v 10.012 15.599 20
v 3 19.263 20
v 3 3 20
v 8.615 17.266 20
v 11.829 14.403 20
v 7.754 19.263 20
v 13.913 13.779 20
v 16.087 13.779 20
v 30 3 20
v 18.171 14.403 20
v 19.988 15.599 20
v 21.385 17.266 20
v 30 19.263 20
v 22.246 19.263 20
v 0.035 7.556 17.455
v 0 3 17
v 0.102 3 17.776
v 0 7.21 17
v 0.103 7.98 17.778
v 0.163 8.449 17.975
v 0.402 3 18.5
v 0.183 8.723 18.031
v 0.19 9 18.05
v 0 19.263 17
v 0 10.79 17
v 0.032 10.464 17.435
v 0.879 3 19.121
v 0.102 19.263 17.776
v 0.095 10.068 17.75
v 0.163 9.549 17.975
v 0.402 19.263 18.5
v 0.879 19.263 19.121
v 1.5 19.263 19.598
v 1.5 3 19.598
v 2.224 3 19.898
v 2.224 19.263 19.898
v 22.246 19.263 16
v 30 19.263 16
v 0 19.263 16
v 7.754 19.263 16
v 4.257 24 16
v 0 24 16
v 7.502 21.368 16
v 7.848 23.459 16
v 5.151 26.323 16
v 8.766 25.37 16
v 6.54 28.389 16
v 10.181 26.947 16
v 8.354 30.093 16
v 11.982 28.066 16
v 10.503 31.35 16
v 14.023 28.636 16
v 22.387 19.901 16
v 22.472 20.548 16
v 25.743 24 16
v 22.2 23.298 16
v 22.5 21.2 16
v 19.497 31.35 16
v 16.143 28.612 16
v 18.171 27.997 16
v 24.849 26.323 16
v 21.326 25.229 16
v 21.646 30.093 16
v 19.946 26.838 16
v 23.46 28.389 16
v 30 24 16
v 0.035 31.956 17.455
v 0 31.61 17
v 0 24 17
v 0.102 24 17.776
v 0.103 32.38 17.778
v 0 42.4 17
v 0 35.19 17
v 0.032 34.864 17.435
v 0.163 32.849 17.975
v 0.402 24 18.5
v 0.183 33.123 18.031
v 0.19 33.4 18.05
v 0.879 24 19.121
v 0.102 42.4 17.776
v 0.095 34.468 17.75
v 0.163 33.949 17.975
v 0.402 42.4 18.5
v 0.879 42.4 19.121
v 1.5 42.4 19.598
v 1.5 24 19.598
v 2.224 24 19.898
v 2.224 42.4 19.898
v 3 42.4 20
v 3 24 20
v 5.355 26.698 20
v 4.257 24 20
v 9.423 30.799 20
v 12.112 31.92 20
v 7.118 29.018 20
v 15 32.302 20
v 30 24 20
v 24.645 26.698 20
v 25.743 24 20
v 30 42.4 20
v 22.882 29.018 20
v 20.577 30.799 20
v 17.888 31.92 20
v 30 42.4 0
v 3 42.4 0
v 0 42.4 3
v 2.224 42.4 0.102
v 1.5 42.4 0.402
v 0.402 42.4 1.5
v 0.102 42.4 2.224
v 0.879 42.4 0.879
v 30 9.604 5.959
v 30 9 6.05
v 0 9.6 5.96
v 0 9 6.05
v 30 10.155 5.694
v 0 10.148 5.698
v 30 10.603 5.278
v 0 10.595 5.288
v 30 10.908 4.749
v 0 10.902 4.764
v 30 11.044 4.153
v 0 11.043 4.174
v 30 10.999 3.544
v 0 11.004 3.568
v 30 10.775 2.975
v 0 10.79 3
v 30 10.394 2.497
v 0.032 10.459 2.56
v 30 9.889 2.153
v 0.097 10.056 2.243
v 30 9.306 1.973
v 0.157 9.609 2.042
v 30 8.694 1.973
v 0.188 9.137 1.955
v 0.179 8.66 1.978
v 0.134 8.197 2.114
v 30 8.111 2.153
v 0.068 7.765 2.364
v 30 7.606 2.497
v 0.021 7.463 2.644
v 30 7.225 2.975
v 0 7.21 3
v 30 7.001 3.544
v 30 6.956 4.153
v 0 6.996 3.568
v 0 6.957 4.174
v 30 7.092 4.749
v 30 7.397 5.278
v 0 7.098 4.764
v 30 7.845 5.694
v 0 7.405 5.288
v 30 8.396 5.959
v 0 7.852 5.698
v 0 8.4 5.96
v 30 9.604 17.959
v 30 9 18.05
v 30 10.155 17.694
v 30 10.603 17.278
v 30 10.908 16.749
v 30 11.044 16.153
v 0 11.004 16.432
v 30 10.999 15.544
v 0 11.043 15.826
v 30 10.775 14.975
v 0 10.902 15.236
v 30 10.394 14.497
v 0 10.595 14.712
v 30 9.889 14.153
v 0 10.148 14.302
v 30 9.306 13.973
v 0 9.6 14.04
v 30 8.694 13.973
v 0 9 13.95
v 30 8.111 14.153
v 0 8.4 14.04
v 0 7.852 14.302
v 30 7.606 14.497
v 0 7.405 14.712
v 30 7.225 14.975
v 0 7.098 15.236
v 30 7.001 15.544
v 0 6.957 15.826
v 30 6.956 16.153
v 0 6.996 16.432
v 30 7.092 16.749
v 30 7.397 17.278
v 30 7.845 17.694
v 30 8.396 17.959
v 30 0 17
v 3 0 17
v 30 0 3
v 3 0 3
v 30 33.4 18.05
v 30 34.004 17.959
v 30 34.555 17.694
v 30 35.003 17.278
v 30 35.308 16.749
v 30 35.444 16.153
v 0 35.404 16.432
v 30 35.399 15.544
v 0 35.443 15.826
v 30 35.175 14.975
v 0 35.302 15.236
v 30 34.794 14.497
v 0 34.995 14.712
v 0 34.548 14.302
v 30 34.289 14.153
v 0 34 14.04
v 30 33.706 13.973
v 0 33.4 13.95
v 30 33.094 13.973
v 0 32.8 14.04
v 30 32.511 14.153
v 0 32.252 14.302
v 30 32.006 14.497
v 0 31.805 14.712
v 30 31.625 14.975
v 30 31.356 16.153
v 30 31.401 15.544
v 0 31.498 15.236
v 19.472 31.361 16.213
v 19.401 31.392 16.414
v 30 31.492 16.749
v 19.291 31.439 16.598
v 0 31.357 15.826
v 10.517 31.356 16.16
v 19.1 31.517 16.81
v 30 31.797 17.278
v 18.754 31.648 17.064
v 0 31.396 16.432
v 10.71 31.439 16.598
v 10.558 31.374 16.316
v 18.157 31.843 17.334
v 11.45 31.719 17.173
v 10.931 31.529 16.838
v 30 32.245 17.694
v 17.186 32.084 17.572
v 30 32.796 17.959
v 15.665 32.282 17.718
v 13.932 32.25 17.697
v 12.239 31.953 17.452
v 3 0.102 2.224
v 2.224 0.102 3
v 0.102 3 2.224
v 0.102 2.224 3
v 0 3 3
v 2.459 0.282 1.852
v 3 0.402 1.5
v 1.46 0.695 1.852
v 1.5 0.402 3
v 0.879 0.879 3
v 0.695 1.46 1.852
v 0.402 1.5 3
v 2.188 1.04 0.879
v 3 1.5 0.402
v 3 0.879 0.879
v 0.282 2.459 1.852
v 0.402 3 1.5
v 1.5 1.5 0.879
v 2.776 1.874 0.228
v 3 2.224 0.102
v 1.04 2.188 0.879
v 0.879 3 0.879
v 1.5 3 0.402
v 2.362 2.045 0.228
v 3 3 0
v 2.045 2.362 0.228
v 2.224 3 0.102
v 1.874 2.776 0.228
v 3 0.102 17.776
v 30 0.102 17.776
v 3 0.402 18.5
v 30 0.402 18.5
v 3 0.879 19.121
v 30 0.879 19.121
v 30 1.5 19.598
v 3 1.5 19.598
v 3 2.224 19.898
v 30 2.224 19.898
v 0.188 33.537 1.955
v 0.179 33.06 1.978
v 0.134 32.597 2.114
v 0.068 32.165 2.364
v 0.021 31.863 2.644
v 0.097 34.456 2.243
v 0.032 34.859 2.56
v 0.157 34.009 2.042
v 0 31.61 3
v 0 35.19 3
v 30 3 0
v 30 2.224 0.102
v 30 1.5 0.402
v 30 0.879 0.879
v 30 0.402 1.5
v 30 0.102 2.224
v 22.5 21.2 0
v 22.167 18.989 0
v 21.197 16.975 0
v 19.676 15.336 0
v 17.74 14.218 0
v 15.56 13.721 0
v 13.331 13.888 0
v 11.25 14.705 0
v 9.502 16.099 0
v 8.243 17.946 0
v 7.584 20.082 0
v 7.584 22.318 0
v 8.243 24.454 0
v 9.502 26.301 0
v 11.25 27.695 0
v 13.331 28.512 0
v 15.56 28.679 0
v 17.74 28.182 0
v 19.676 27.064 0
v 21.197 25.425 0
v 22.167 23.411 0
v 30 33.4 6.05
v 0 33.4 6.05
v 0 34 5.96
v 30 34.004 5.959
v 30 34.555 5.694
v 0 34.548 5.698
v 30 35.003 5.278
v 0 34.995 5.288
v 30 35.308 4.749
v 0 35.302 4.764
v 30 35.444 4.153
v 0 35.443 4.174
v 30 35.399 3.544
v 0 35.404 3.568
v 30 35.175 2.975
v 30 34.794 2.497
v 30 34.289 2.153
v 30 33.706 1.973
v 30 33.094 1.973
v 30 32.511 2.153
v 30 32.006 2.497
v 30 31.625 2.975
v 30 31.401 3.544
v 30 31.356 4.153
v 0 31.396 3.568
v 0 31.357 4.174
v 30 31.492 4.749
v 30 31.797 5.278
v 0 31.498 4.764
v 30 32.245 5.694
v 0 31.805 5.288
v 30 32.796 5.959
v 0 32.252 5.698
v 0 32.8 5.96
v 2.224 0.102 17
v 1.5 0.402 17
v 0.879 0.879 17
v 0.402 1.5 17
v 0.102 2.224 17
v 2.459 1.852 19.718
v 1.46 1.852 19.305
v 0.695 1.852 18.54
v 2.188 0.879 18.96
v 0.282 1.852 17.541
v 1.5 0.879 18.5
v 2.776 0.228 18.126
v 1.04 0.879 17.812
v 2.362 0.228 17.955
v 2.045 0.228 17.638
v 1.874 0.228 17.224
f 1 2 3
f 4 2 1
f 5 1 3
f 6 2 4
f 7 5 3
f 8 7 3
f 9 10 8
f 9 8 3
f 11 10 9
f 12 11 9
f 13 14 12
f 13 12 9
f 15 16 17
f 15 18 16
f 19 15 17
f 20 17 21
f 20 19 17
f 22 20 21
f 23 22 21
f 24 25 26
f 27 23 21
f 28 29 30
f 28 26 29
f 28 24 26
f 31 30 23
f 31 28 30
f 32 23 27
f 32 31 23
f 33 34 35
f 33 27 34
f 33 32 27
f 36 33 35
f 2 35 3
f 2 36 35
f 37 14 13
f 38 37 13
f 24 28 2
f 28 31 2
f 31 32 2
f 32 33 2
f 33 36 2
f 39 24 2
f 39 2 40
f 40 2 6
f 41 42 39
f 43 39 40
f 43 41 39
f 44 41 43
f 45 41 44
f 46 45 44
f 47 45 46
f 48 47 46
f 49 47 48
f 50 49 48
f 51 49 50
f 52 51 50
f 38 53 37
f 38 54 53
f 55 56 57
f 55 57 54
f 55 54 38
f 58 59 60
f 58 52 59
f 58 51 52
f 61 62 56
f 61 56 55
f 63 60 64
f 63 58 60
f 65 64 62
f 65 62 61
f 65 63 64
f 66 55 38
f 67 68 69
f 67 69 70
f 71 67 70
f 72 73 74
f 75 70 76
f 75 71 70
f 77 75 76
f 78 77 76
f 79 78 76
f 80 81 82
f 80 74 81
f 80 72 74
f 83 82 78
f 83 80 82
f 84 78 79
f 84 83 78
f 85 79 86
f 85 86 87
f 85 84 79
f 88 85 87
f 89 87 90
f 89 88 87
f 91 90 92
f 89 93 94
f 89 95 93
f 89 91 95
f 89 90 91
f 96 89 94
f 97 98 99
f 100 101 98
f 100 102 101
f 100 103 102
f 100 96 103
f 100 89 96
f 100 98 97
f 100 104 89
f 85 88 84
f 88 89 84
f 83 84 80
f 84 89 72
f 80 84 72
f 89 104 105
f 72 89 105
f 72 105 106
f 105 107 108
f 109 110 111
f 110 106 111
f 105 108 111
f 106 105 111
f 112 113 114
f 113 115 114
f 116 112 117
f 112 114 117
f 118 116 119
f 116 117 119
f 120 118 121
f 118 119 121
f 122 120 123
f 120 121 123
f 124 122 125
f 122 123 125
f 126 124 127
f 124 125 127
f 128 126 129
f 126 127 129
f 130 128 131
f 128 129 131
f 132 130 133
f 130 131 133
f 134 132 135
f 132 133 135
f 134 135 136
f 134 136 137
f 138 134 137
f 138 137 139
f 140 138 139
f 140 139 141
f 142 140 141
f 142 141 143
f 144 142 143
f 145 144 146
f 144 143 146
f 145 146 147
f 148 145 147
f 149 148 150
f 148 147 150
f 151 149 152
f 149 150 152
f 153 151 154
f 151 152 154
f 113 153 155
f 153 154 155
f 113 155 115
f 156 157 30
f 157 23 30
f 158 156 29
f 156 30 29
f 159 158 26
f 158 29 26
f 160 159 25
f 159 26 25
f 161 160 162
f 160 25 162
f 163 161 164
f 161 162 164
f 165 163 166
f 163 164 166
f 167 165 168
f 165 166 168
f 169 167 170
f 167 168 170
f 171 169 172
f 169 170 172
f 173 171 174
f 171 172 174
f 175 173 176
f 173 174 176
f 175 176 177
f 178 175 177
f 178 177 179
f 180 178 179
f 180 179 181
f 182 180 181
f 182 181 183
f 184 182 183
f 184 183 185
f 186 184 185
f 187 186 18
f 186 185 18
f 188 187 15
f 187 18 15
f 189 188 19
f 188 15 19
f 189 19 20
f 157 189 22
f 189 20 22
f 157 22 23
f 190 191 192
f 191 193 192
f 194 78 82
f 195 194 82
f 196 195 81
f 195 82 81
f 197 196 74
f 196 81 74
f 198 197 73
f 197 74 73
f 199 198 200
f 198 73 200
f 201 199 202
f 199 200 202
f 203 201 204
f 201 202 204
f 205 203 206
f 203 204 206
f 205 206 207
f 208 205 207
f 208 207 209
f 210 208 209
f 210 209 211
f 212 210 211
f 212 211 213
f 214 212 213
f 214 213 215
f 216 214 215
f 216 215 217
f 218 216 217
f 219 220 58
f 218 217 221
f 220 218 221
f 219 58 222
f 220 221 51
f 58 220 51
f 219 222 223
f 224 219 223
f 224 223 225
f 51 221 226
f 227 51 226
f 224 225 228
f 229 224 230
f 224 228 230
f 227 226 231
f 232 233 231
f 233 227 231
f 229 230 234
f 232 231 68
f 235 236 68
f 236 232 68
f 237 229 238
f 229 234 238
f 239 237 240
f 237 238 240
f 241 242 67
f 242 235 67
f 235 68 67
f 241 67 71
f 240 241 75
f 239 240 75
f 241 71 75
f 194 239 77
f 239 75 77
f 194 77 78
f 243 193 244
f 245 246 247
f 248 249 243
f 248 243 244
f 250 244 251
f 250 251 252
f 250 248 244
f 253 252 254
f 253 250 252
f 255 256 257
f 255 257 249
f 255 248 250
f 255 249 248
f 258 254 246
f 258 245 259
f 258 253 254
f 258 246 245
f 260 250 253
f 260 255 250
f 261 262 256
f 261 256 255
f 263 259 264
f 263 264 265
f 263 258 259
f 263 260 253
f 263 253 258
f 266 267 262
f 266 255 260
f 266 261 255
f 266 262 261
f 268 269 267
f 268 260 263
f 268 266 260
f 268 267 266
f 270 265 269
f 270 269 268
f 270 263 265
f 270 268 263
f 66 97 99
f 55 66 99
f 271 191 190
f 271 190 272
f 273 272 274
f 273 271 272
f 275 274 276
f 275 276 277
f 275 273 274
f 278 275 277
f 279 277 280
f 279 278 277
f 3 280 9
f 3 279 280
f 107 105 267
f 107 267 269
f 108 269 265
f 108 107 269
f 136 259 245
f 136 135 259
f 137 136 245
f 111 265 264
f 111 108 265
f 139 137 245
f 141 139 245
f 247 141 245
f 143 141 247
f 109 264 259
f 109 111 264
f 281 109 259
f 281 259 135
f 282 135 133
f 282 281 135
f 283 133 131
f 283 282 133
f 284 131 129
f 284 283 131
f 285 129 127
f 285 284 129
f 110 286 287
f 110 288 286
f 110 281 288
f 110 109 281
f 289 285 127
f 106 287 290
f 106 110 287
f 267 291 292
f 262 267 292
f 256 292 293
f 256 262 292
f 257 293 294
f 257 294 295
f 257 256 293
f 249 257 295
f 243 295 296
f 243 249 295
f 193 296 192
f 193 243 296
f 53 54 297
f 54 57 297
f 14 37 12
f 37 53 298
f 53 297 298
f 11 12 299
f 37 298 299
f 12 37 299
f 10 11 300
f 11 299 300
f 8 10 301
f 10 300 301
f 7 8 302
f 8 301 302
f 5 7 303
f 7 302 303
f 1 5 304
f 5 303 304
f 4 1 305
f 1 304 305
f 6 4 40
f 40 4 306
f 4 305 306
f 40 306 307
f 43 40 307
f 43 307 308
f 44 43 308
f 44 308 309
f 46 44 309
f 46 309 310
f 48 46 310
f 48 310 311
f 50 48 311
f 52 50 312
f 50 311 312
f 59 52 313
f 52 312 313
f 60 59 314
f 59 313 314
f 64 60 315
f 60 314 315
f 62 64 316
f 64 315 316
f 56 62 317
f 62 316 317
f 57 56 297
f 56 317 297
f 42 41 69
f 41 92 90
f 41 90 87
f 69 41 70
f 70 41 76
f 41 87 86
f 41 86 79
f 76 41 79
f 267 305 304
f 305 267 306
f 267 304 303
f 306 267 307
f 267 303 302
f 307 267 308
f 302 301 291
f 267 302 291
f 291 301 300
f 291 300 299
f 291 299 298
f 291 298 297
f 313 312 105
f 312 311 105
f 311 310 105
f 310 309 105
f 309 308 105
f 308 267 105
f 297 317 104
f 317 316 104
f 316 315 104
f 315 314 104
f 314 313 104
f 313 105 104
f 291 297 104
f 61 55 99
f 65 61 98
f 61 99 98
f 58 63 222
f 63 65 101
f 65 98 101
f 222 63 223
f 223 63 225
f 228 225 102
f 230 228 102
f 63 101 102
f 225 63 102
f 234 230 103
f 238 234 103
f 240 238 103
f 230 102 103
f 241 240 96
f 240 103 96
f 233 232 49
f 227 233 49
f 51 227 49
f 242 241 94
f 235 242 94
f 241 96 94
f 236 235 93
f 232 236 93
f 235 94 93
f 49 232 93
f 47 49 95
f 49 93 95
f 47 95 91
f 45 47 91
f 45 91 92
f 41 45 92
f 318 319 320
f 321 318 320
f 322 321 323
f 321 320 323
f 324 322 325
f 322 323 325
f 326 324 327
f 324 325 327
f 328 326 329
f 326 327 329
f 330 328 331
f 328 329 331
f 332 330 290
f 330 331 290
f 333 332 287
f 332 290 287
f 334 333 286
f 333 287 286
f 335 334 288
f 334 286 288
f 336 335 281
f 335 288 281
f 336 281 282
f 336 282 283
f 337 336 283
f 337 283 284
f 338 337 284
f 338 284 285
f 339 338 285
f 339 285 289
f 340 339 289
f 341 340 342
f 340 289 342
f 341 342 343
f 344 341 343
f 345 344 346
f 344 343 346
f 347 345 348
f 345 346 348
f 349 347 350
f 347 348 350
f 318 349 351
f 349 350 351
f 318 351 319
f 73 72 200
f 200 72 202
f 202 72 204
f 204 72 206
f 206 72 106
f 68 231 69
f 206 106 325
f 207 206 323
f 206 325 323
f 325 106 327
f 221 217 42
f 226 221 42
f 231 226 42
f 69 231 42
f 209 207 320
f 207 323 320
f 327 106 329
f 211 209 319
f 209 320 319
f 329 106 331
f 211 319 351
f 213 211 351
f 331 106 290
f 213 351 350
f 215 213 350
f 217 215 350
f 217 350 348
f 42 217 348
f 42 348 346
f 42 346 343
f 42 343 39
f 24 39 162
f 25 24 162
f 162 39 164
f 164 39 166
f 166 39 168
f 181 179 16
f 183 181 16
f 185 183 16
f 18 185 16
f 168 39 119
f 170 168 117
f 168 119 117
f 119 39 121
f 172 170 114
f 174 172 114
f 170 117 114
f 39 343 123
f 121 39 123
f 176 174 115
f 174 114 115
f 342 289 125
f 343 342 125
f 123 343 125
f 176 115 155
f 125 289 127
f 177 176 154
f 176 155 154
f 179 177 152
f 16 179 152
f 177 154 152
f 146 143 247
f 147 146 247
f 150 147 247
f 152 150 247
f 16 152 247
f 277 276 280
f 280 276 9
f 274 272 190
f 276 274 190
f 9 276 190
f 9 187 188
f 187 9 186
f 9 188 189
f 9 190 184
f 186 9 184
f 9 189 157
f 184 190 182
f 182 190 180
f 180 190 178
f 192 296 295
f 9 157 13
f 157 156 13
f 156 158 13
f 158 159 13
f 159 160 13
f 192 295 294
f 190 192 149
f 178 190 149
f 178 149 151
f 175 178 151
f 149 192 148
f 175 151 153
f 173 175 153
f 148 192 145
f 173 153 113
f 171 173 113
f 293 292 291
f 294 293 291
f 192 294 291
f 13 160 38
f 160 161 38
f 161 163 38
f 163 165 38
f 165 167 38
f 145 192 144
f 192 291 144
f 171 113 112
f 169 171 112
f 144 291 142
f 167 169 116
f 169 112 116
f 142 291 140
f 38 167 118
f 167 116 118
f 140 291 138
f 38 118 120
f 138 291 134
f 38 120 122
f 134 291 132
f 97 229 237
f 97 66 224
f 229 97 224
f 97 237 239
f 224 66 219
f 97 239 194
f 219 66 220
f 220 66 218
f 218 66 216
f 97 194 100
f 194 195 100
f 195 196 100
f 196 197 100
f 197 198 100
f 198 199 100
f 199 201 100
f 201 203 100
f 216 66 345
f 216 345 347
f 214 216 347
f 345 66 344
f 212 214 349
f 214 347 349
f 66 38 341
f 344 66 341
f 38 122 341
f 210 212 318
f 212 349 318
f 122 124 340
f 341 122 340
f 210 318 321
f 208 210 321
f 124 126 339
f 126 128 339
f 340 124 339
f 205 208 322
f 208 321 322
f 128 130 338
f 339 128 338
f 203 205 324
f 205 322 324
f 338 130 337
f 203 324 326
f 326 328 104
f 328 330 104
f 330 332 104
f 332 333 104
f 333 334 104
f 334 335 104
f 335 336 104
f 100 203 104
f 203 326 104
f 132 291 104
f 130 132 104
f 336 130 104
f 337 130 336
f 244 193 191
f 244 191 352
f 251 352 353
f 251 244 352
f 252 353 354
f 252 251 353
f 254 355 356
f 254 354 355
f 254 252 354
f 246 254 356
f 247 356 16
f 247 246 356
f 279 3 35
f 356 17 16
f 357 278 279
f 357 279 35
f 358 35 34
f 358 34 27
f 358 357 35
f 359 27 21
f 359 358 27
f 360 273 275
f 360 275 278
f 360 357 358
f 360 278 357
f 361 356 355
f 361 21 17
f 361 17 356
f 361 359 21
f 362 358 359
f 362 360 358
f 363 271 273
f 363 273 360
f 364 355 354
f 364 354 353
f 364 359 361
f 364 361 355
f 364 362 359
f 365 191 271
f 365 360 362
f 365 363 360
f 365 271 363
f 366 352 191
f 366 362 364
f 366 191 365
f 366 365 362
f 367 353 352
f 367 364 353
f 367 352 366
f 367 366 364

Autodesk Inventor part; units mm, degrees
ref_plane "YZ Plane" through (0, 0, 0) normal (1, 0, 0) x (0, 1, 0)
ref_plane "XZ Plane" through (0, 0, 0) normal (0, 1, 0) x (-1, 0, 0)
ref_plane "XY Plane" through (0, 0, 0) normal (0, 0, 1) x (1, 0, 0)
sketch "Sketch1" plane through (0, 0, 0) normal (0, 0, 1) x (1, 0, 0)
  line L0 (0, 0) -> (30, 0)
  line L1 (30, 0) -> (30, 42.4)
  line L2 (30, 42.4) -> (0, 42.4)
  line L3 (0, 42.4) -> (0, 0)
  circle A0 centre (15, 21.2) radius 7.5
  dimension "d0" = 42.4
  dimension "d1" = 30
  dimension "d2" = 15
  dimension "d3" = 21.2
  dimension "d4" = 15
extrude "Extrusion1" add sketch "Sketch1" along normal blind 20
sketch "Sketch2" plane through (0, 0, 0) normal (-1, 0, 0) x (0, 0, 1)
  line L0 (20, 0) -> (20, 42.4) projected
  line L1 (0, 42.4) -> (20, 42.4) projected
  line L2 (0, 42.4) -> (0, 0) projected
  line L3 (0, 0) -> (20, 0) projected
  circle A0 centre (4, 33.4) radius 2.05
  circle A1 centre (16, 33.4) radius 2.05
  circle A2 centre (4, 9) radius 2.05
  circle A3 centre (16, 9) radius 2.05
  dimension "d7" = 4.1
  dimension "d8" = 4
  dimension "d9" = 4
  dimension "d10" = 4
  dimension "d11" = 4
  dimension "d12" = 9
  dimension "d13" = 9
  dimension "d14" = 9
  dimension "d15" = 9
extrude "Extrusion6" cut sketch "Sketch2" against normal through all contours A0 | A1 | A2 | A3
fillet "Fillet3" radius 3 3 edges at (0, 21.2, 20) (0, 21.2, 0) (0, 0, 10)
fillet "Fillet4" radius 3 4 edges at (0.8787, 0.8787, 19.1213) (16.5, 0, 20) (0.8787, 0.8787, 0.8787) (16.5, 0, 0)
sketch "Sketch6" plane through (0, 0, 20) normal (0, 0, 1) x (1, 0, 0)
  circle A0 centre (15, 21.2) radius 7.5 projected
  line L0 (30, 42.4) -> (30, 3) projected
  line L1 (0, 24) -> (0, 19.2632)
  line L2 (30, 24) -> (25.7429, 24)
  line L3 (4.2571, 24) -> (0, 24)
  arc A1 (25.7429, 24) -> (4.2571, 24) centre (15, 21.2) ccw
  line L4 (0, 19.2632) -> (7.7544, 19.2632)
  line L5 (22.2456, 19.2632) -> (30, 19.2632)
  point P0 (0, 0)
extrude "Extrusion7" cut sketch "Sketch6" against normal blind 4 contours A0 L4 L1 L3 A1 L2 L0 L5
sketch "Sketch3" plane through (0, 0, 0) normal (0, -1, 0) x (1, 0, 0)
  line L0 (30, 20) -> (0, 20) projected
  line L1 (0, 0) -> (0, 20) projected
  line L2 (30, 0) -> (30, 20) projected
  circle A0 centre (5, 10) radius 2.05
  circle A1 centre (25, 10) radius 2.05
  dimension "d18" = 4.1
  dimension "d19" = 5
  dimension "d20" = 5
  dimension "d21" = 10
  dimension "d22" = 10
sketch "Sketch4" plane through (0, 0, 0) normal (-1, 0, 0) x (0, 0, 1)
  circle A0 centre (16, 9) radius 2.05 projected
  circle A1 centre (4, 9) radius 2.05 projected
  circle A2 centre (16, 33.4) radius 2.05 projected
  circle A3 centre (4, 33.4) radius 2.05 projected
  circle A4 centre (4, 33.4) radius 3.75
  circle A5 centre (16, 33.4) radius 3.75
  circle A6 centre (4, 9) radius 3.75
  circle A7 centre (16, 9) radius 3.75
  dimension "d25" = 7.5
sketch "Sketch5" plane through (0, 0, 0) normal (0, -1, 0) x (1, 0, 0)
  circle A0 centre (25, 10) radius 2.05 projected
  circle A1 centre (5, 10) radius 2.05 projected
  circle A2 centre (5, 10) radius 3.75
  circle A3 centre (25, 10) radius 3.75
  dimension "d28" = 7.5
equation "\"d3\" = 0.5 * d0"
equation "\"d9\" = d8"
equation "\"d10\" = d8"
equation "\"d11\" = d8"
equation "\"d13\" = d12"
equation "\"d14\" = d12"
equation "\"d15\" = d12"
equation "\"d20\" = d19"
properties part number "V5 multi bottom"
